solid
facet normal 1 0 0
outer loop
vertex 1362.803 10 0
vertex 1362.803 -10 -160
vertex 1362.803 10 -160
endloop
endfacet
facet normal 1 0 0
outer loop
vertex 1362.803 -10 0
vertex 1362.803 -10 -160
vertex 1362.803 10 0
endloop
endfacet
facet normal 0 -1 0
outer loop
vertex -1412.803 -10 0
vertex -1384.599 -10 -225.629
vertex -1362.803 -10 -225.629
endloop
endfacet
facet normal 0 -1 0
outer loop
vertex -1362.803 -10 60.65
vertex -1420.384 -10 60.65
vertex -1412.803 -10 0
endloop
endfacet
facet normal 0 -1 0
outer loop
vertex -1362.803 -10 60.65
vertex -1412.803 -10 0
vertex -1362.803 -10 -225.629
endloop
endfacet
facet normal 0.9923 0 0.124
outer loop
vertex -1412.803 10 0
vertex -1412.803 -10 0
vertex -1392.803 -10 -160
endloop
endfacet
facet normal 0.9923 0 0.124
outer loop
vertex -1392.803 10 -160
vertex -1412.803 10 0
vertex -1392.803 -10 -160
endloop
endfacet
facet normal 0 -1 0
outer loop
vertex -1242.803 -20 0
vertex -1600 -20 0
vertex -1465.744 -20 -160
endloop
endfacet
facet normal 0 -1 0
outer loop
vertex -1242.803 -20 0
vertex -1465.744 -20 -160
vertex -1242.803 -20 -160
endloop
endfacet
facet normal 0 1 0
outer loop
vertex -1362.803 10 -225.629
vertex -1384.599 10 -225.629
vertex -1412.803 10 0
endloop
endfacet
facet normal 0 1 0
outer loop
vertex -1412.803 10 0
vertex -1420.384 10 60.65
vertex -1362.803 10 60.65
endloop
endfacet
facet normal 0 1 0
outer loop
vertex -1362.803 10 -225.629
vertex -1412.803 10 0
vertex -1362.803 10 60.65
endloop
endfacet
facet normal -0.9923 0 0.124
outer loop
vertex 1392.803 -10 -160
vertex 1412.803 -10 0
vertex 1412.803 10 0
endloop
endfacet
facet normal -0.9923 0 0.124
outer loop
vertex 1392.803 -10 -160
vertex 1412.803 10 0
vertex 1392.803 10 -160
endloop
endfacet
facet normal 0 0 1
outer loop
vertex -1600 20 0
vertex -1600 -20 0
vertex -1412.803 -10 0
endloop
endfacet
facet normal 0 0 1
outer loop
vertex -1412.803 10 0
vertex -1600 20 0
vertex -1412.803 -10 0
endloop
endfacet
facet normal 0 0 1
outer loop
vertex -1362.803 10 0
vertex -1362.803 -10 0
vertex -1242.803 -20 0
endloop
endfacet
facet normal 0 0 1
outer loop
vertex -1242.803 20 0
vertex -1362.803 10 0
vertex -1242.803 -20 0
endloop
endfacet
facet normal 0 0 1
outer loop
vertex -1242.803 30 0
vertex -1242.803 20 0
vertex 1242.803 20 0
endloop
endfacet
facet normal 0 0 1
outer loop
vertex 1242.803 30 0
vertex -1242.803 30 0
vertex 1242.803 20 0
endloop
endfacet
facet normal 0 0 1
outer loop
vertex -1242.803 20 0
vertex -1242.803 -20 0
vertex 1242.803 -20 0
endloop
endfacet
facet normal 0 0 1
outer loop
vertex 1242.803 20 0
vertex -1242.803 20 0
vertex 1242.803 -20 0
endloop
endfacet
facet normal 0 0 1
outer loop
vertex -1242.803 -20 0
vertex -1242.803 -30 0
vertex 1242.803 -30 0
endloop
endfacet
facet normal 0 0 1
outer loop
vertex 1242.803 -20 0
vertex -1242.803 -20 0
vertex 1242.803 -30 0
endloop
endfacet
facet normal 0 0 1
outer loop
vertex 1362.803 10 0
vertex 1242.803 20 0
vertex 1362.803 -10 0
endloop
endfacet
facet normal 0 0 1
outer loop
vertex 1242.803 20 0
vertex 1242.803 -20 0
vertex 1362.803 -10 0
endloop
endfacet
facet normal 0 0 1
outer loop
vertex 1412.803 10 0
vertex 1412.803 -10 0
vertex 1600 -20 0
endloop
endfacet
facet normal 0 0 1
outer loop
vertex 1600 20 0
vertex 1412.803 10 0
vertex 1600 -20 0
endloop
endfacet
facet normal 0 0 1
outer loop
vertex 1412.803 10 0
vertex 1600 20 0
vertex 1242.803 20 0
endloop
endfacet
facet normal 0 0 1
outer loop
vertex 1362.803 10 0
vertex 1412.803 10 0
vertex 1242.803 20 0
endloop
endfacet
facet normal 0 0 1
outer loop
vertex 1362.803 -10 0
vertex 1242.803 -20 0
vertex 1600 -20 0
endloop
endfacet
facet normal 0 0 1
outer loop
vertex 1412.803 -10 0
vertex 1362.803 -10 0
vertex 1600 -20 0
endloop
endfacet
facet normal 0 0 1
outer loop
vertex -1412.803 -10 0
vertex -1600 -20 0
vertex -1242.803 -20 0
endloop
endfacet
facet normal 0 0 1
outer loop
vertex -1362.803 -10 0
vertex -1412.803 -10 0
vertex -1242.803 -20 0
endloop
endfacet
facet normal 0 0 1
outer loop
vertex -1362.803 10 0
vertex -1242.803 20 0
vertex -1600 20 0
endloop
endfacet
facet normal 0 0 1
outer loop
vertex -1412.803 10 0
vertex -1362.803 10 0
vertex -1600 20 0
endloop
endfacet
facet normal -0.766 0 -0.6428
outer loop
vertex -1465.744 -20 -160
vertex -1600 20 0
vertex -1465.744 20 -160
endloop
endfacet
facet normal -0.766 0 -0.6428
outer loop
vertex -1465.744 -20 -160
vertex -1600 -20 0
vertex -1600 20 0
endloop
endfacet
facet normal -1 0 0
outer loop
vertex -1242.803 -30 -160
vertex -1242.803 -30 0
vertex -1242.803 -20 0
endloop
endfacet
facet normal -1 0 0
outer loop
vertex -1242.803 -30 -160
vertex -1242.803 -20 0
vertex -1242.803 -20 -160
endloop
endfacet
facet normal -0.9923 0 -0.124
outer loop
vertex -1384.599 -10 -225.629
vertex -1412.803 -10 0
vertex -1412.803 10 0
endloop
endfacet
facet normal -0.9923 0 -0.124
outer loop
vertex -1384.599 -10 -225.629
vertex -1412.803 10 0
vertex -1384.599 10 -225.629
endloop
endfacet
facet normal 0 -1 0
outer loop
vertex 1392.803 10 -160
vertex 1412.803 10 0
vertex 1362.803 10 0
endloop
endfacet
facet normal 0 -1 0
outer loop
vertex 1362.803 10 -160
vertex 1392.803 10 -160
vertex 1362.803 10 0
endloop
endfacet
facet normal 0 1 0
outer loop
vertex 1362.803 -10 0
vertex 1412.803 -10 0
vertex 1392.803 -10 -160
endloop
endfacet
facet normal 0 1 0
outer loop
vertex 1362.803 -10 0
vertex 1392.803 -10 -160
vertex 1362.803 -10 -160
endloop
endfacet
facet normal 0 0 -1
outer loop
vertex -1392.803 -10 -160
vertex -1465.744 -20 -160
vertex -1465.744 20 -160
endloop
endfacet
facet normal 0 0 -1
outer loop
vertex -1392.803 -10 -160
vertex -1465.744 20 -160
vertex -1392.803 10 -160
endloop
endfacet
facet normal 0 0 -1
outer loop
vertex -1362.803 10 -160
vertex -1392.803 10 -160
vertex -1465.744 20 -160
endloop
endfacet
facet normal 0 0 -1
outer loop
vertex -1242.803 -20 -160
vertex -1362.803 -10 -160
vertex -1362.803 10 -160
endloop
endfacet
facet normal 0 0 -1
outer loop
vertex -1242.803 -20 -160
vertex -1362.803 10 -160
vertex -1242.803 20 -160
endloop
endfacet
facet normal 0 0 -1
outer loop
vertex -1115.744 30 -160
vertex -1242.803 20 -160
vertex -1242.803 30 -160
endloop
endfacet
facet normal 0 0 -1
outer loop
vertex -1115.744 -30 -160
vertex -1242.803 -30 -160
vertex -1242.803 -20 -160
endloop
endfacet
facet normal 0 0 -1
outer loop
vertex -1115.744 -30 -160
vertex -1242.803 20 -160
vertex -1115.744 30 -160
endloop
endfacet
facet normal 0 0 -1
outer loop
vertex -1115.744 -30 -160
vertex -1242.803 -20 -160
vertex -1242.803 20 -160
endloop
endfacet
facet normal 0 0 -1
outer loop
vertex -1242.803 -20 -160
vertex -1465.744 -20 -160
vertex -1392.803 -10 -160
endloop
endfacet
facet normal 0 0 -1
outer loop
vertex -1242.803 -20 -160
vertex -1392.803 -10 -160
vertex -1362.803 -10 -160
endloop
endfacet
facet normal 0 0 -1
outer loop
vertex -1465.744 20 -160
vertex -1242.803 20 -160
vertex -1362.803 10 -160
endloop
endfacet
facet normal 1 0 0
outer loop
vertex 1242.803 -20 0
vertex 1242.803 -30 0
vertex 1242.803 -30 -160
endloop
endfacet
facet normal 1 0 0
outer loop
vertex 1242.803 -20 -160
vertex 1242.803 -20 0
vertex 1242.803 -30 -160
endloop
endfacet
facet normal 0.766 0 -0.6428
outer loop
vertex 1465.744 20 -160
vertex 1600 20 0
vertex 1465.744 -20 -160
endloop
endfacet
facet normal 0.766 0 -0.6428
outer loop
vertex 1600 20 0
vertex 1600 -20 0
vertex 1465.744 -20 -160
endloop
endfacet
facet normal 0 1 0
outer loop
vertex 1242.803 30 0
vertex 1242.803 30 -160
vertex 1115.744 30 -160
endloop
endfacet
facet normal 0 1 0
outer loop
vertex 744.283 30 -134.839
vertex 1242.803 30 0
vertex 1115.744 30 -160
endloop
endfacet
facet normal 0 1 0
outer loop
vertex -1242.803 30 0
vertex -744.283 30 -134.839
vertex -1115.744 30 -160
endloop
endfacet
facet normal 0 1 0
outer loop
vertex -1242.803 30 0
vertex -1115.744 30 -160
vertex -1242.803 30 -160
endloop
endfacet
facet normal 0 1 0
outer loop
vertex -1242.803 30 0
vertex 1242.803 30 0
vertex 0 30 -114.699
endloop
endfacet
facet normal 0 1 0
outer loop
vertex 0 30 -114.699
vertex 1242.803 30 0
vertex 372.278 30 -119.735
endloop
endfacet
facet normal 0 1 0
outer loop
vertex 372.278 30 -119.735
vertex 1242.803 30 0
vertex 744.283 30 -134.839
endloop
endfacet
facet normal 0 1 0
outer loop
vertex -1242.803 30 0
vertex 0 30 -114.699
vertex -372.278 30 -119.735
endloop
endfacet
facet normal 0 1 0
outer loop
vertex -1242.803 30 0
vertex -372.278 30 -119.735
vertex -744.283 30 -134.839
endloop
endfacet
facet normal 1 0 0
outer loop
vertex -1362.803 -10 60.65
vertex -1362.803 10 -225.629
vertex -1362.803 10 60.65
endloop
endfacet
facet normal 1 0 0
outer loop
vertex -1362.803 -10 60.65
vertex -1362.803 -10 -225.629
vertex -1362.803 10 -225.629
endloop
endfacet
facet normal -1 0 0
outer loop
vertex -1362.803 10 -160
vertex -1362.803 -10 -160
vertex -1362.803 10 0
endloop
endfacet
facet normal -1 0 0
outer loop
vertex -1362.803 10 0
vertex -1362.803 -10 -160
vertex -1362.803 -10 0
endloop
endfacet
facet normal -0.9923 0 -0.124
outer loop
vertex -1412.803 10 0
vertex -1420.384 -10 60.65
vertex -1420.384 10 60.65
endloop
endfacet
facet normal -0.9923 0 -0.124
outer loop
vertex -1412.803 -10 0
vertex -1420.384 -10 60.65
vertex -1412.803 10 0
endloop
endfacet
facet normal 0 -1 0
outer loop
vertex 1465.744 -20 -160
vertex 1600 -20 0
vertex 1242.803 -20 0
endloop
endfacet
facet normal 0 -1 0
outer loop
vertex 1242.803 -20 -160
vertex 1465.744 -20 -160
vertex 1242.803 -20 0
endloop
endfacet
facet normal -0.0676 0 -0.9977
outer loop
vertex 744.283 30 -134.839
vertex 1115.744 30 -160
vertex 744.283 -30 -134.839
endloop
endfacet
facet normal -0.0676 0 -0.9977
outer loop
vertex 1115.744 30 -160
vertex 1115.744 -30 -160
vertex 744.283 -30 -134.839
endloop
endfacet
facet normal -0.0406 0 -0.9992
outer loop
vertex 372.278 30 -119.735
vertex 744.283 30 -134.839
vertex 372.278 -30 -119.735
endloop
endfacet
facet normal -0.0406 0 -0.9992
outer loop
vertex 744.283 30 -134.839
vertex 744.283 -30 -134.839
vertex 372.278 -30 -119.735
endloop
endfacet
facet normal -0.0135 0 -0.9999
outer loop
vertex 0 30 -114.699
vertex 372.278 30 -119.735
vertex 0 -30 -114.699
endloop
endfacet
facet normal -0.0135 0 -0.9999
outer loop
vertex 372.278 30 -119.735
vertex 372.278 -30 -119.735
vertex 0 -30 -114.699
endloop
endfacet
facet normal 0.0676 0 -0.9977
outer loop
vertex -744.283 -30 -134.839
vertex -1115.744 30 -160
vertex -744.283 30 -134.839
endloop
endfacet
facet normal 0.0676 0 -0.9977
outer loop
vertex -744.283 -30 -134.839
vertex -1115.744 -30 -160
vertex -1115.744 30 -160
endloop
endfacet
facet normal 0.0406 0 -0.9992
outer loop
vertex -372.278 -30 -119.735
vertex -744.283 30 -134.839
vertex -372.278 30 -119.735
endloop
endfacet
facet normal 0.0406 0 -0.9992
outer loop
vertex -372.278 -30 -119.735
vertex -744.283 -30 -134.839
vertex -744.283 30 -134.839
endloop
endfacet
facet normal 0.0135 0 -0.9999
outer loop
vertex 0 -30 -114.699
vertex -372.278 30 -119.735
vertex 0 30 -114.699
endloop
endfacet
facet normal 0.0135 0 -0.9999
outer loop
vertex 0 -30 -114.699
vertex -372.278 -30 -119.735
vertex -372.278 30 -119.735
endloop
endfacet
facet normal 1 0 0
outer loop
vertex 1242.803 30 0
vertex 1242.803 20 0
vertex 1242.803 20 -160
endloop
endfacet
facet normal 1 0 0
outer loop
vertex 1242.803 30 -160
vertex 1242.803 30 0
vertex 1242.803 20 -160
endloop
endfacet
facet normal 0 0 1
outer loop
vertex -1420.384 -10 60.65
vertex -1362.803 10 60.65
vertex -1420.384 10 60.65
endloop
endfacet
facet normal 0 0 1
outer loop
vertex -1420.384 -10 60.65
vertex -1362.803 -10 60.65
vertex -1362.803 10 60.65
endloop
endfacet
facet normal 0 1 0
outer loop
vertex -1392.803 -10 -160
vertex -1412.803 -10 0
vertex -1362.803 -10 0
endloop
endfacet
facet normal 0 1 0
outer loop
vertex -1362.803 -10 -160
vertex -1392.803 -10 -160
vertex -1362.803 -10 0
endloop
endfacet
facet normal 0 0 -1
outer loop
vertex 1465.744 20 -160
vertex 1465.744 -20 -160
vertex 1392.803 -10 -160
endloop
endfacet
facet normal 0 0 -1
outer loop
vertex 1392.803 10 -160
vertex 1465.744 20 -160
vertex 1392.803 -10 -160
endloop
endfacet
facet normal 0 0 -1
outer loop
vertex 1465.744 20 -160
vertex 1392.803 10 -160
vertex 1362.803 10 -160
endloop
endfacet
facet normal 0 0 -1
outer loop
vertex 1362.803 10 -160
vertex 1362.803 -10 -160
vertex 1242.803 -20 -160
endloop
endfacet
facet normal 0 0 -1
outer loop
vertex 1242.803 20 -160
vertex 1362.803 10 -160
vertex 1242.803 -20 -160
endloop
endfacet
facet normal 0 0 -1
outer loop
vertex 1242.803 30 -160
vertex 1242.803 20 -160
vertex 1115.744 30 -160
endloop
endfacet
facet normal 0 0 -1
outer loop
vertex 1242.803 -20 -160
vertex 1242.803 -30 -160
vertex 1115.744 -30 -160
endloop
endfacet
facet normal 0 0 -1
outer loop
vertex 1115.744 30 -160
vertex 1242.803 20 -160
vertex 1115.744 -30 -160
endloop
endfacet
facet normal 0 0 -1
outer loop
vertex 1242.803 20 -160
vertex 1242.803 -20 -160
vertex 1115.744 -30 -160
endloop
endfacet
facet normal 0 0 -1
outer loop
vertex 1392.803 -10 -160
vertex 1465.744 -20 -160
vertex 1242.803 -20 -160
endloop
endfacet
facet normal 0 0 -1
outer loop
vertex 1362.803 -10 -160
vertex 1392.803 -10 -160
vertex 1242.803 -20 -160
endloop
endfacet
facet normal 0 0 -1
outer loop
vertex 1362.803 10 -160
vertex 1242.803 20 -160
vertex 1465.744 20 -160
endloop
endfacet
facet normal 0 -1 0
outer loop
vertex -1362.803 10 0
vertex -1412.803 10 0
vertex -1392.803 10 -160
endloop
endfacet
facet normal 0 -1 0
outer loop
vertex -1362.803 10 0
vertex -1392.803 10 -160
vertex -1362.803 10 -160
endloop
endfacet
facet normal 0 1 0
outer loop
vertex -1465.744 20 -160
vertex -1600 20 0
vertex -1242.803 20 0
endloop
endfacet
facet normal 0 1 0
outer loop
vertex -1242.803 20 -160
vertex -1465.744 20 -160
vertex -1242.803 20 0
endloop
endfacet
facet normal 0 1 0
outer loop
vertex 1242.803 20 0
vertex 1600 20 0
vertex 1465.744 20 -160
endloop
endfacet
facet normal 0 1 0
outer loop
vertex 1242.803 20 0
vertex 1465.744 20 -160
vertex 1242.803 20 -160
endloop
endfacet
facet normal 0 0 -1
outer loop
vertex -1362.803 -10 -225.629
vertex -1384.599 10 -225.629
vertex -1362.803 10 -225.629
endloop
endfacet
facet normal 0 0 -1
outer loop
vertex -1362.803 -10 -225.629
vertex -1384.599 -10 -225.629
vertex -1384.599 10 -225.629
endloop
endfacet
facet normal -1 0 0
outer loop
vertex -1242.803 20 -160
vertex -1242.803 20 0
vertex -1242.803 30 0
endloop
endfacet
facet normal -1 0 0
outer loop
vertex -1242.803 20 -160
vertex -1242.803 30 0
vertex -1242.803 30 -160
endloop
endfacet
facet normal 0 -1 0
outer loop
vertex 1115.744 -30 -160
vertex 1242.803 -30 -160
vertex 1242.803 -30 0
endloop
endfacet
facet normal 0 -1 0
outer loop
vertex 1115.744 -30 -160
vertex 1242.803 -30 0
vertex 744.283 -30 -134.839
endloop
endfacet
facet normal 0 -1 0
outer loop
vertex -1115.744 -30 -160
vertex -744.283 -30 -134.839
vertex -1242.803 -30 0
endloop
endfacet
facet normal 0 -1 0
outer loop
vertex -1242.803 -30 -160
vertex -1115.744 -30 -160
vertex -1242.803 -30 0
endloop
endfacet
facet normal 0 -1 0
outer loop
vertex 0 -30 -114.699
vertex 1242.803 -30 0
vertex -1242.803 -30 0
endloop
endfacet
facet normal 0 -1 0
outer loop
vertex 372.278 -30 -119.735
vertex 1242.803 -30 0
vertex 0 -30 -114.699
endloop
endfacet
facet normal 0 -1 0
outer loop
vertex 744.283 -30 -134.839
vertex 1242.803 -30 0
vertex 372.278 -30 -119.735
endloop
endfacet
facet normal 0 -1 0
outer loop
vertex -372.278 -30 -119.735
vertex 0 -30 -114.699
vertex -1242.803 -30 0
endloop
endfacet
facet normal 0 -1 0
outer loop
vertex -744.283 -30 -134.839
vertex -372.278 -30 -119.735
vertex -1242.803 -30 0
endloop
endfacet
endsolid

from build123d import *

# Parameters (mm, degrees)
F0_W     = 120
F0_H     = 160
F1_DEPTH = 20
F2_DEPTH = 10
F4_DEPTH = 30


with BuildPart() as f1:
    # F0 (on Front) → F1 (new body, symmetric)
    with BuildSketch(Plane.XZ):
        Polygon((-1392.802696, -160), (-1412.802696, 0), (-1600, 0), (-1465.744059, -160), align=None)
        with Locations((-1302.802696, -80)):
            Rectangle(F0_W, F0_H)
        Polygon((-1362.802696, -160), (-1362.802696, 0), (-1412.802696, 0), (-1392.802696, -160), align=None)
    extrude(amount=F1_DEPTH, both=True)


with BuildPart() as f2:
    # F0 (on Front) → F2 (new body, symmetric)
    with BuildSketch(Plane.XZ):
        Polygon((-1362.802696, -160), (-1362.802696, 0), (-1412.802696, 0), (-1392.802696, -160), align=None)
        Polygon((-1412.802696, 0), (-1362.802696, 0), (-1362.802696, 60.649661), (-1420.383904, 60.649661), align=None)
        Polygon((-1362.802696, -225.629424), (-1362.802696, -160), (-1392.802696, -160), (-1384.599018, -225.629424), align=None)
    extrude(amount=F2_DEPTH, both=True)


with BuildPart() as f1_1:
    add(f1.part)

    # F3: cut F2
    add(f2.part, mode=Mode.SUBTRACT)

    # F0 (on Front) → F4 (join, symmetric)
    with BuildSketch(Plane.XZ):
        with BuildLine():
            Line((0, -114.69923), (0, 0))
            Line((0, 0), (-1242.802696, 0))
            Line((-1242.802696, 0), (-1242.802696, -160))
            Line((-1242.802696, -160), (-1115.744059, -160))
            ThreePointArc((-1115.744059, -160), (-558.331659, -126.029086), (0, -114.69923))
        make_face()
    extrude(amount=F4_DEPTH, both=True)

    # F5: F1 across plane


with BuildPart() as f1_2:
    add(f1_1.part)
    add(f1_1.part.mirror(Plane.YZ))


solid = Compound([f2.part, f1_2.part])
